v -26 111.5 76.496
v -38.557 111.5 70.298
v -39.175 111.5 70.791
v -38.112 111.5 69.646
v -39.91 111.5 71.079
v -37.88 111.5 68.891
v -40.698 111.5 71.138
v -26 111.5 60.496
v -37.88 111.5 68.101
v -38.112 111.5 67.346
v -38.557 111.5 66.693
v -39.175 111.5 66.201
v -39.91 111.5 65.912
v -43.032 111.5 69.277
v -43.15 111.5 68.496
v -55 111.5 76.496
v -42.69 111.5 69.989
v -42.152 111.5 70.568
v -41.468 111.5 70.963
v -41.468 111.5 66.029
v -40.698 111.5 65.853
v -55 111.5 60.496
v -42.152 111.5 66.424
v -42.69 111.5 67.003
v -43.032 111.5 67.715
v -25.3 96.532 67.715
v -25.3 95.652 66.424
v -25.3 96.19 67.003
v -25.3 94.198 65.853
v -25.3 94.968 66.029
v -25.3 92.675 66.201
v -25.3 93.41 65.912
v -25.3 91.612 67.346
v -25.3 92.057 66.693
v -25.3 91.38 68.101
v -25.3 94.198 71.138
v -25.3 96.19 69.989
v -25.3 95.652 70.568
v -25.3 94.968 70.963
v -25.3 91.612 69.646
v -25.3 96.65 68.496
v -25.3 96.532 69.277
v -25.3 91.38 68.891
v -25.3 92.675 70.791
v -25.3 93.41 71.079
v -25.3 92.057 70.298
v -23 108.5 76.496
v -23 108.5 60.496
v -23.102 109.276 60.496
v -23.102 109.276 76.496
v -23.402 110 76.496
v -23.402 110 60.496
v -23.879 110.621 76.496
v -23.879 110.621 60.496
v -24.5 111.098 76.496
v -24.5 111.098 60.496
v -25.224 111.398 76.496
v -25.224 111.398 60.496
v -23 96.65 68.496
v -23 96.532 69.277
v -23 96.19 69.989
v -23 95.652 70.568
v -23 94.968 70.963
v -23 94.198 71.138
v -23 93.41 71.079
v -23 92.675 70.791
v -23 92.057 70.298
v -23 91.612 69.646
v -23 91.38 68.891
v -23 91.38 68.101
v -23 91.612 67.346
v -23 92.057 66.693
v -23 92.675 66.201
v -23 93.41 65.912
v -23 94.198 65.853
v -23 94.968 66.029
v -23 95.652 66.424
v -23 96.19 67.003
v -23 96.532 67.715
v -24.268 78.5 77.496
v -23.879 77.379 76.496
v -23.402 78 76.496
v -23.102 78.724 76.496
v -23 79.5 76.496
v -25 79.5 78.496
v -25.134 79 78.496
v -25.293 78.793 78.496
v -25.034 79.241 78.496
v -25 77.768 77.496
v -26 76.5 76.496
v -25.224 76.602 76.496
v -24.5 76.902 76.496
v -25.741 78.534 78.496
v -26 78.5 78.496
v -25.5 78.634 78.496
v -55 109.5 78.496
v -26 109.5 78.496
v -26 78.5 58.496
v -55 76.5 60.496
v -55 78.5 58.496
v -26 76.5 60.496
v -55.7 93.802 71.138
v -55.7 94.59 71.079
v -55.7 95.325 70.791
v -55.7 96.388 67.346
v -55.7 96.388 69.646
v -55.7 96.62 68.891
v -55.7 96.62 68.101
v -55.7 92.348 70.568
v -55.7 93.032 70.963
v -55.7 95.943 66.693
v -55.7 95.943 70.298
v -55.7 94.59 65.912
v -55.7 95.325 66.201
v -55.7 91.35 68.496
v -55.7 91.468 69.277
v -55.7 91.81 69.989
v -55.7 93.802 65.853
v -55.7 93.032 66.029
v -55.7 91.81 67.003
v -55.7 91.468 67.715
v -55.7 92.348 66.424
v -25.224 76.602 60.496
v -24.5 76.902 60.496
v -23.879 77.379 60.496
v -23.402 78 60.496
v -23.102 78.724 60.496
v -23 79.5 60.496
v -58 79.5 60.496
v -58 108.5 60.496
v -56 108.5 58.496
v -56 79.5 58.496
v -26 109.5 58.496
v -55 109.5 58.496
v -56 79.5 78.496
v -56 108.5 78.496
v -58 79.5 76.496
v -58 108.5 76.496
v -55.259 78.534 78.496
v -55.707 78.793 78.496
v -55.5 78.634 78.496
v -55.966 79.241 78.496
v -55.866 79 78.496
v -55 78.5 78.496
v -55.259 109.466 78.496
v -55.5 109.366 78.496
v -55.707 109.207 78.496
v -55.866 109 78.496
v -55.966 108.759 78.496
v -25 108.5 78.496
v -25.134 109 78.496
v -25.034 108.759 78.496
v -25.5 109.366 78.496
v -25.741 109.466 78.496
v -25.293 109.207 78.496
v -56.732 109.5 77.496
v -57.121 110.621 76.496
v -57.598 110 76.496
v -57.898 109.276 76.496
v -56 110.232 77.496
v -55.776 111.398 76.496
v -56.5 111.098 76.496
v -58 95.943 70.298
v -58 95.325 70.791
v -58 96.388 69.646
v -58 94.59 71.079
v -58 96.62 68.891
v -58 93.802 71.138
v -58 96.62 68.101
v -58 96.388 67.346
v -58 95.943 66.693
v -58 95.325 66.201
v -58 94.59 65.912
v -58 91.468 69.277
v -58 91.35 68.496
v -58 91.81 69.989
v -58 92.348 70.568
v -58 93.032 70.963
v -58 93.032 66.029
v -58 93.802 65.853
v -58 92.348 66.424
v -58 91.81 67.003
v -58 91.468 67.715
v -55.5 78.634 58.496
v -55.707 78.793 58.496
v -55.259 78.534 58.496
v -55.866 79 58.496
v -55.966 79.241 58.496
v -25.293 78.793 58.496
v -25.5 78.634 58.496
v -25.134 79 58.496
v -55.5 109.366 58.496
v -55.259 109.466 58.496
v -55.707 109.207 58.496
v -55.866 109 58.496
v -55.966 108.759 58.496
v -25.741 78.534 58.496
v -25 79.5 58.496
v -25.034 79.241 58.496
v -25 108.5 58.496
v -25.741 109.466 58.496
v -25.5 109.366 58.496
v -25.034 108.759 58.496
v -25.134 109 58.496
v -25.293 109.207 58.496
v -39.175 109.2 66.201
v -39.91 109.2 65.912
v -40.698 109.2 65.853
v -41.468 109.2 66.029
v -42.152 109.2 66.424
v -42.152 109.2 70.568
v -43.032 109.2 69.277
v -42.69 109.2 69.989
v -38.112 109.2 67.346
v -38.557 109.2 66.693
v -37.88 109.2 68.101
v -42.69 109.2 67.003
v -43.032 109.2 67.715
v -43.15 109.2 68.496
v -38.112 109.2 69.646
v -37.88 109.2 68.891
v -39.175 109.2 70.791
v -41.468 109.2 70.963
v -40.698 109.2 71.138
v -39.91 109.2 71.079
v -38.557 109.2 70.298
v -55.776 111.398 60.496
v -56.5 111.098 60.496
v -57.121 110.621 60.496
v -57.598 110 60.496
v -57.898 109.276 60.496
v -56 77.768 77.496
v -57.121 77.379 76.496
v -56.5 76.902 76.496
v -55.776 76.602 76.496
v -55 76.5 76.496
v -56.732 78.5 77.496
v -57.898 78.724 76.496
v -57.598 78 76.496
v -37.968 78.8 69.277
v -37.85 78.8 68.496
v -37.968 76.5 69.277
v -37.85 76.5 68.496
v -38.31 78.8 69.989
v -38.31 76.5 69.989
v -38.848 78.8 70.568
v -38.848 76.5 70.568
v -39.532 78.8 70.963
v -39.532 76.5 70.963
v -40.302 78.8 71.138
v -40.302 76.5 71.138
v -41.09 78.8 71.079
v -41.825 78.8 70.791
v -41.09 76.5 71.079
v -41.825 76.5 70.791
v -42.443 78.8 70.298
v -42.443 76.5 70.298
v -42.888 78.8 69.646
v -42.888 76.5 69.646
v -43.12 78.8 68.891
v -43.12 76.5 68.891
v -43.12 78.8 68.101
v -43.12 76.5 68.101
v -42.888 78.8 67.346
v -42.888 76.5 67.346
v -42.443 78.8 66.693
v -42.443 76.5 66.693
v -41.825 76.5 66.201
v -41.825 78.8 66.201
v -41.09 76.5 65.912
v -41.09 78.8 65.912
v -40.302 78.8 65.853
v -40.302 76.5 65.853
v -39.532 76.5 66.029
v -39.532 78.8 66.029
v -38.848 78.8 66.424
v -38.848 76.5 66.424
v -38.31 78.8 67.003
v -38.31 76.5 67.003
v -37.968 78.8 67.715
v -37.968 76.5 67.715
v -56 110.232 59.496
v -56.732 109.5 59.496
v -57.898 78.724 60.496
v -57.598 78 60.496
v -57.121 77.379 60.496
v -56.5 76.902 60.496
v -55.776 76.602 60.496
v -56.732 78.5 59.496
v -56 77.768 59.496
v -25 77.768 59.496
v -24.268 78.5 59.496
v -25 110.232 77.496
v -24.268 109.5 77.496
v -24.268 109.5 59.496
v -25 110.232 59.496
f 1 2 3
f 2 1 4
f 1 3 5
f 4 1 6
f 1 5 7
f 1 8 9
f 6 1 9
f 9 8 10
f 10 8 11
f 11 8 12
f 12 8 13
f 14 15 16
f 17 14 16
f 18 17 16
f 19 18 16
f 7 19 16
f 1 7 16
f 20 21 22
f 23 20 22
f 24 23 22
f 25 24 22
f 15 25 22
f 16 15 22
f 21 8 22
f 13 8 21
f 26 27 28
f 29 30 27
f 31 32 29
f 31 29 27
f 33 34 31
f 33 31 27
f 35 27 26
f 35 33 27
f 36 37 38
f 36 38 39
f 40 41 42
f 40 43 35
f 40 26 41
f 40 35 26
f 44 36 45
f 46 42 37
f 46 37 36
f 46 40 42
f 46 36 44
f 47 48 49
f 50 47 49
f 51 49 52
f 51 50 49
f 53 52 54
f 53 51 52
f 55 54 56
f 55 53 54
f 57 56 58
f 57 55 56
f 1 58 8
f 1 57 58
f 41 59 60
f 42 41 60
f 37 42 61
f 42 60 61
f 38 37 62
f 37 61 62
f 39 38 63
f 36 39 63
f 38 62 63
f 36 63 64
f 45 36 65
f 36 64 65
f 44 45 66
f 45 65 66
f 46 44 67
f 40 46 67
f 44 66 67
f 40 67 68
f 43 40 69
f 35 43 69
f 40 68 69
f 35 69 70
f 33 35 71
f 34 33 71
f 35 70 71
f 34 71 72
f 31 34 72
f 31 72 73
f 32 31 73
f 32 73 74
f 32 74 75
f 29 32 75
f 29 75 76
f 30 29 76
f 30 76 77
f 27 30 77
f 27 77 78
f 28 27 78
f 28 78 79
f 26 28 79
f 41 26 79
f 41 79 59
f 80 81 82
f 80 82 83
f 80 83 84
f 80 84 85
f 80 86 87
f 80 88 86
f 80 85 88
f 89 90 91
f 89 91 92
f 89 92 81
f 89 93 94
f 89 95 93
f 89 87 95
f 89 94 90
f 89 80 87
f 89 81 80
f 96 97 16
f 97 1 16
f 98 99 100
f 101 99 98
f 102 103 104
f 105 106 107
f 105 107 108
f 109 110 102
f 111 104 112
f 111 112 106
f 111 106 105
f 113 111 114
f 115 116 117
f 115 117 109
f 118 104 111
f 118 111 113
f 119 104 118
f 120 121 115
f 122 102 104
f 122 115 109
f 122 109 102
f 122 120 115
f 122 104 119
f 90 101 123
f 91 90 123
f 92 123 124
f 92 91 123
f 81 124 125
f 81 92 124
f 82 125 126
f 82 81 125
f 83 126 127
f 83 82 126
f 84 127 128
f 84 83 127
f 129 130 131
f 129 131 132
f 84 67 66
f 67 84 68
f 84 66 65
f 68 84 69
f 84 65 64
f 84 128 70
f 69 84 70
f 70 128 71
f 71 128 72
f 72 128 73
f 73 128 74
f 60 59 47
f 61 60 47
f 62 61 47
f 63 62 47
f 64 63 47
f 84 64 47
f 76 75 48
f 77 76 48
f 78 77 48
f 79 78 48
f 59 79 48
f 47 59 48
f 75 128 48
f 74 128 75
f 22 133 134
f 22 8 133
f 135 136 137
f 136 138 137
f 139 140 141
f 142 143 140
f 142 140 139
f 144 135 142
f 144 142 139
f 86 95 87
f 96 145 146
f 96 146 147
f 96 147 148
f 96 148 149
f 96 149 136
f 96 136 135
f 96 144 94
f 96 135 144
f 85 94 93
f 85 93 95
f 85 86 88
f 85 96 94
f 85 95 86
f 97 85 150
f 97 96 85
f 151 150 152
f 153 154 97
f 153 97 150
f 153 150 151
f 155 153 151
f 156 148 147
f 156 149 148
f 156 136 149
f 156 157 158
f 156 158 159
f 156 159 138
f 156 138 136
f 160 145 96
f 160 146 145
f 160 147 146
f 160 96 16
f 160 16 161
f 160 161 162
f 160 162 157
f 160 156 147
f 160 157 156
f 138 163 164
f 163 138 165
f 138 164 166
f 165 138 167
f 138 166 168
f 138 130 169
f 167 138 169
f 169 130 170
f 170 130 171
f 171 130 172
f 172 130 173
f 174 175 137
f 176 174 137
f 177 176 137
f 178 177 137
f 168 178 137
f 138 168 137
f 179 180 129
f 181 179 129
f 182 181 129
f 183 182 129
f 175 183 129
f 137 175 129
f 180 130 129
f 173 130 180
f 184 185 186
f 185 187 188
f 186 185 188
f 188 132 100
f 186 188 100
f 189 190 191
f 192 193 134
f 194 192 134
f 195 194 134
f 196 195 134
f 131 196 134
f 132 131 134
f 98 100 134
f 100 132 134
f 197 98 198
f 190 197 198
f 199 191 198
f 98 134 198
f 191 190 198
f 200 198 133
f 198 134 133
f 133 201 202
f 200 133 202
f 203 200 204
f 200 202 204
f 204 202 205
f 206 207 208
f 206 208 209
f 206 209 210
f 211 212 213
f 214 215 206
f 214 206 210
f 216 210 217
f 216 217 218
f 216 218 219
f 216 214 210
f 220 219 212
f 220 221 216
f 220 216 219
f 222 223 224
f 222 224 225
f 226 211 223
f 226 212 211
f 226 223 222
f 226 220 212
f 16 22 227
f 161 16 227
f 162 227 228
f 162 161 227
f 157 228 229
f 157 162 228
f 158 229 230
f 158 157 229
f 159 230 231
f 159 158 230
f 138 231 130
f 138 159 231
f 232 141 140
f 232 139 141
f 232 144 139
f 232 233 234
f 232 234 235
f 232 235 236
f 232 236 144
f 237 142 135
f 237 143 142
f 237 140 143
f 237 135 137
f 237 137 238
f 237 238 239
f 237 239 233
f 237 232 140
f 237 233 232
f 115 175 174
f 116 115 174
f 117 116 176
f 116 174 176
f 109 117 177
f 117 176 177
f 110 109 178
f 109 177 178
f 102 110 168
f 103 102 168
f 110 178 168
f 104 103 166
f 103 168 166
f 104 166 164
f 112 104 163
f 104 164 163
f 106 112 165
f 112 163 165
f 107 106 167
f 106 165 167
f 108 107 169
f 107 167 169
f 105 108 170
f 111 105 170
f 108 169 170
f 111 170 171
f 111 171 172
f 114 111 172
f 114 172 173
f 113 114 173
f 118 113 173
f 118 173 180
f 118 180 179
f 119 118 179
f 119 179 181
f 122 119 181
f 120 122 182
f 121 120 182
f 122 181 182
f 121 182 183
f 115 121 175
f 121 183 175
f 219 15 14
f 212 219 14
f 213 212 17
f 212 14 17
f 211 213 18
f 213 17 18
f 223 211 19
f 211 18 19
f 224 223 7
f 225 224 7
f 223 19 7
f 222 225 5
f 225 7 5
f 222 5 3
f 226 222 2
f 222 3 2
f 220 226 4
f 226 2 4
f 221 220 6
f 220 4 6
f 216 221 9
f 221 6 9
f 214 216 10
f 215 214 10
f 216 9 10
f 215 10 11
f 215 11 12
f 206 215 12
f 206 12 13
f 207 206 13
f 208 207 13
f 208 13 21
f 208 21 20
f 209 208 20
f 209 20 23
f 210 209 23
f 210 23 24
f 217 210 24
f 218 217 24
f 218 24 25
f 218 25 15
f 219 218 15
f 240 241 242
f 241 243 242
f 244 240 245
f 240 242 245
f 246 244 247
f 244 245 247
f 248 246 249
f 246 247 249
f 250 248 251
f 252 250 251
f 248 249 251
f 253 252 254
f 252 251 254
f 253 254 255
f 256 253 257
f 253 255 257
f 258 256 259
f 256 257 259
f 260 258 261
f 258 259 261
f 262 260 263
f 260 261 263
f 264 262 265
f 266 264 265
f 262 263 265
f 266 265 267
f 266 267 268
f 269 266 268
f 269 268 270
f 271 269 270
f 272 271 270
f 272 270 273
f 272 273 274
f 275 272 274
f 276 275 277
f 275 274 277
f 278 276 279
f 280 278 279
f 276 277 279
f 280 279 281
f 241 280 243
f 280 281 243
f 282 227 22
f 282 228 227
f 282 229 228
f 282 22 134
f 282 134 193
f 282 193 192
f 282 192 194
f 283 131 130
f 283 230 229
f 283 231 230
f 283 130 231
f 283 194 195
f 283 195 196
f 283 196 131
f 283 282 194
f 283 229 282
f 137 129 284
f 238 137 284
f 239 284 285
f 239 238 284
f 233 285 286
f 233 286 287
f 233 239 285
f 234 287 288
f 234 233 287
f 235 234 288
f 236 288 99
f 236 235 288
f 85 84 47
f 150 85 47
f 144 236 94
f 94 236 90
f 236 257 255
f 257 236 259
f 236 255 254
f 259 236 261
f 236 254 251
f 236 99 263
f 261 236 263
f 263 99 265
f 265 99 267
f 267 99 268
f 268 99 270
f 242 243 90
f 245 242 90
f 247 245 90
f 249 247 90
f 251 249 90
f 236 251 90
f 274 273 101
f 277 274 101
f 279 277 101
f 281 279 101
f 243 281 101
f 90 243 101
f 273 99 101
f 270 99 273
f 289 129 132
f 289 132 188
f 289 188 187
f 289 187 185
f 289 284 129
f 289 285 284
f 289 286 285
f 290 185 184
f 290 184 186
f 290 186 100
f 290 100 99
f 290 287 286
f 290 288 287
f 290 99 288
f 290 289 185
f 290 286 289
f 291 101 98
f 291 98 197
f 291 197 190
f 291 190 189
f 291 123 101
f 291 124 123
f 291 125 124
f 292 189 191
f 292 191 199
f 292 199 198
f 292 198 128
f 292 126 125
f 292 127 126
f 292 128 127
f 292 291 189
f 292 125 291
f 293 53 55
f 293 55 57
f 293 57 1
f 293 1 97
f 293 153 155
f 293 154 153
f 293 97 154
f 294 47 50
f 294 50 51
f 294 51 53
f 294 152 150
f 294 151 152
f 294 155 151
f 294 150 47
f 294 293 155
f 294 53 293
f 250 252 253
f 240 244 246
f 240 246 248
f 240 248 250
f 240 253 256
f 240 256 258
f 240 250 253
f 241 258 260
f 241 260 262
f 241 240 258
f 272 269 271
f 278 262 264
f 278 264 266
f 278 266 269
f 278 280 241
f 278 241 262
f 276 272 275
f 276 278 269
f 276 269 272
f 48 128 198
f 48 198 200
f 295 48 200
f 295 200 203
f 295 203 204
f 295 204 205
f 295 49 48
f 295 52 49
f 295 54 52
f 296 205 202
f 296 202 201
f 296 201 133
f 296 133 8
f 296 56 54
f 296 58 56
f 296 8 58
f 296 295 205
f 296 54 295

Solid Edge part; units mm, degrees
sketch "Sketch1" plane through (0, 0, 58.4958) normal (0, 0, 1) x (1, 0, 0)
  line L0 (-58, 76.5) -> (-23, 76.5)
  line L1 (-23, 76.5) -> (-23, 111.5)
  line L2 (-23, 111.5) -> (-58, 111.5)
  line L3 (-58, 111.5) -> (-58, 76.5)
extrude "Protrusion1" add sketch "Sketch1" along normal blind 20
fillet "Round_1" radius 3 4 edges at (-23, 111.5, 68.4958) (-58, 111.5, 68.4958) (-58, 76.5, 68.4958) (-23, 76.5, 68.4958)
chamfer "Chamfer_3" distance 2 angle 45 15 edges at (-58, 94, 78.4958) (-57.1213, 77.3787, 78.4958) (-40.5, 76.5, 78.4958) (-23.8787, 77.3787, 78.4958) (-23, 94, 78.4958) (-23.8787, 110.6213, 78.4958) (-40.5, 111.5, 78.4958) (-57.1213, 110.6213, 78.4958) (-58, 94, 58.4958) (-57.1213, 77.3787, 58.4958) (-40.5, 76.5, 58.4958) (-23.8787, 77.3787, 58.4958) (-23, 94, 58.4958) (-40.5, 111.5, 58.4958) (-57.1213, 110.6213, 58.4958)
sketch "Sketch2" plane through (-40.5, 76.5, 65.9958) normal (0, -1, 0) x (1, 0, 0)
  circle A0 centre (0, 2.5) radius 2.65
extrude "ExtrudedCutout_1" cut sketch "Sketch2" against normal blind 2.3
sketch "Sketch3" plane through (-40.5, 111.5, 65.9958) normal (0, 1, 0) x (-1, 0, 0)
  circle A0 centre (0, 2.5) radius 2.65
extrude "ExtrudedCutout_4" cut sketch "Sketch3" against normal blind 2.3
sketch "Sketch4" plane through (-58, 94, 65.9958) normal (-1, 0, 0) x (0, -1, 0)
  circle A0 centre (0, 2.5) radius 2.65
extrude "ExtrudedCutout_5" cut sketch "Sketch4" against normal blind 2.3
sketch "Sketch5" plane through (-23, 94, 65.9958) normal (1, 0, 0) x (0, 1, 0)
  circle A0 centre (0, 2.5) radius 2.65
extrude "ExtrudedCutout_6" cut sketch "Sketch5" against normal blind 2.3
